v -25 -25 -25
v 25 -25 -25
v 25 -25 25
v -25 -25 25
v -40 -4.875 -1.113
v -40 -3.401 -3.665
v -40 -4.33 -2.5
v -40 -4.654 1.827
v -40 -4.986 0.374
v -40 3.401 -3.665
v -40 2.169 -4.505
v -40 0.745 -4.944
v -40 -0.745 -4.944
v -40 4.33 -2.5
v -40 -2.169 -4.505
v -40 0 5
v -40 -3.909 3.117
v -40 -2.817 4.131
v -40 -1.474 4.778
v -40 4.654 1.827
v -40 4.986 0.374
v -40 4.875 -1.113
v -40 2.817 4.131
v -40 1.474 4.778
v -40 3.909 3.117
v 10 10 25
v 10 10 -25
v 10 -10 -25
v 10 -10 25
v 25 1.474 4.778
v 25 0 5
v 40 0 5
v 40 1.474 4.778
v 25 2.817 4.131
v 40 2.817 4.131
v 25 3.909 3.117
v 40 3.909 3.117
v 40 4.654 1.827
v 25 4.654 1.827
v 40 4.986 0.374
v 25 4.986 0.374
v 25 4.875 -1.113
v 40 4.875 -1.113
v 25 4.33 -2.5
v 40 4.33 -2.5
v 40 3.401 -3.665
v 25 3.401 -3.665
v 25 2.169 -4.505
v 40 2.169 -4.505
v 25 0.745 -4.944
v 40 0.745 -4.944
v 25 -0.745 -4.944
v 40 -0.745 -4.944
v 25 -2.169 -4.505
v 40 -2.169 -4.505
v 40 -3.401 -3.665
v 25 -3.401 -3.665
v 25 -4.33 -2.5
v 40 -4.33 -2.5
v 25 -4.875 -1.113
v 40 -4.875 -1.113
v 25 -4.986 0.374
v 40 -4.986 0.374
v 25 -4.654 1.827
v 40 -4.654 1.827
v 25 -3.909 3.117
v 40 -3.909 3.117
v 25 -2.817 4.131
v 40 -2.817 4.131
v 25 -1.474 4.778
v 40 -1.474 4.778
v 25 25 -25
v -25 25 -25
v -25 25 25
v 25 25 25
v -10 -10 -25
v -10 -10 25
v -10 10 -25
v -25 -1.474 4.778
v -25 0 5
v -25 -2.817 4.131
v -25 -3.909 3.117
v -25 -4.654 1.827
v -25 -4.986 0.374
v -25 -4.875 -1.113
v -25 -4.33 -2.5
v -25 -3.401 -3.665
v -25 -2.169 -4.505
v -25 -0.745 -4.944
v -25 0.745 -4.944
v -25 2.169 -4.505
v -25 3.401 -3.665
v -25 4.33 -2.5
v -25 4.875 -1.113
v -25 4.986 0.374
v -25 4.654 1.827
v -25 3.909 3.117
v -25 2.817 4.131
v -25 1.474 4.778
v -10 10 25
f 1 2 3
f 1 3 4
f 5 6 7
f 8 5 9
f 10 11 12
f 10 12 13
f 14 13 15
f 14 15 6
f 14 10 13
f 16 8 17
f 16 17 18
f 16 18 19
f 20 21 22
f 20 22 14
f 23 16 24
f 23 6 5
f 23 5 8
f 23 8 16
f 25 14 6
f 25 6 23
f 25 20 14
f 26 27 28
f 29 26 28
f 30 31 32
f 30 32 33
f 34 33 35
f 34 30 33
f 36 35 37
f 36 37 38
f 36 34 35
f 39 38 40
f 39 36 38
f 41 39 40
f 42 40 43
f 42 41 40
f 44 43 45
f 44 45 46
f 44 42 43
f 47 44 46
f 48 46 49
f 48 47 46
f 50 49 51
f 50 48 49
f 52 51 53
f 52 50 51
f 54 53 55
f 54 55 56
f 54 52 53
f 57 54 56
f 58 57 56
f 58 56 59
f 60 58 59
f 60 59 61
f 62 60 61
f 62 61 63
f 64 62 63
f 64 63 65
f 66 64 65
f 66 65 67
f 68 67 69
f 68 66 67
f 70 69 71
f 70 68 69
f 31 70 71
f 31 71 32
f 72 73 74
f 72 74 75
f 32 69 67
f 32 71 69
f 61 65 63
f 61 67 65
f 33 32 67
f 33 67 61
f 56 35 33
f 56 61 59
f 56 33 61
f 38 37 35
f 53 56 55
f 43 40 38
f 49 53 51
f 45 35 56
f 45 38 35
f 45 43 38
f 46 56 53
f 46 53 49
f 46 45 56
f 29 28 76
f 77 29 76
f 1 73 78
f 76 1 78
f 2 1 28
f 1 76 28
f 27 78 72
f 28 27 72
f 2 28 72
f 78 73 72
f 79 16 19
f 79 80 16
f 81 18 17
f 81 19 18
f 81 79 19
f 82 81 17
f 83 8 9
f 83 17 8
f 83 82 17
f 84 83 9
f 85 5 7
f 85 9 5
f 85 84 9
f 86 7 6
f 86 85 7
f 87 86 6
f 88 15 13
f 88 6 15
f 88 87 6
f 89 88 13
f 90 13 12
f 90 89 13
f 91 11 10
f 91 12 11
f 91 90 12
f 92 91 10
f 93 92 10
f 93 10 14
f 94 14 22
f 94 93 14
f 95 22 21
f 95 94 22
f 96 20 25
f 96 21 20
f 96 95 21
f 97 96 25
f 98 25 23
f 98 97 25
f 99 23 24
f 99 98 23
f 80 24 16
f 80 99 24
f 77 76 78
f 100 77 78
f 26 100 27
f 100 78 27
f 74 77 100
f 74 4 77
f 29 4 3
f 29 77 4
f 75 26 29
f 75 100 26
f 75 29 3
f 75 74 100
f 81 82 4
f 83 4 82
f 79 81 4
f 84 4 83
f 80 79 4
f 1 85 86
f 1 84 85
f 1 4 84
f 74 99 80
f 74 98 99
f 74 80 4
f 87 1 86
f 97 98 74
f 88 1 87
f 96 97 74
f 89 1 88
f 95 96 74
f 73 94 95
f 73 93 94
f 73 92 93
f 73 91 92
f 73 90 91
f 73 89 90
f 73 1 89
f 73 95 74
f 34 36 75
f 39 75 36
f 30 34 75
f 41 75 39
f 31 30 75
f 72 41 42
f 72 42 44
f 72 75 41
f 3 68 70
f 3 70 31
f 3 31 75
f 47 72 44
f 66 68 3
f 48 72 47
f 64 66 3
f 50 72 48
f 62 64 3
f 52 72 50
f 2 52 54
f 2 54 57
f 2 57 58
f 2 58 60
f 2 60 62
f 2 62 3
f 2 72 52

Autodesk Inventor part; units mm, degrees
ref_plane "YZ Plane" through (0, 0, 0) normal (1, 0, 0) x (0, 1, 0)
ref_plane "XZ Plane" through (0, 0, 0) normal (0, 1, 0) x (-1, 0, 0)
ref_plane "XY Plane" through (0, 0, 0) normal (0, 0, 1) x (1, 0, 0)
sketch "Sketch1" plane through (0, 0, 0) normal (0, 0, 1) x (1, 0, 0)
  line L0 (-25, 25) -> (25, 25)
  line L1 (25, 25) -> (25, -25)
  line L2 (25, -25) -> (-25, -25)
  line L3 (-25, -25) -> (-25, 25)
  line L4 (-10, 10) -> (10, 10)
  line L5 (10, 10) -> (10, -10)
  line L6 (10, -10) -> (-10, -10)
  line L7 (-10, -10) -> (-10, 10)
  point P0 (0, 0)
  dimension "d0" = 50
  dimension "d1" = 50
  dimension "d2" = 25
  dimension "d3" = 25
  dimension "d4" = 20
  dimension "d5" = 20
  dimension "d6" = 10
  dimension "d7" = 10
extrude "Extrusion1" add sketch "Sketch1" along normal mid plane 50
sketch "Sketch2" plane through (-25, -25, 25) normal (-1, 0, 0) x (0, 0, 1)
  circle A0 centre (-25, 25) radius 5
  dimension "d10" = 10
extrude "Extrusion2" add sketch "Sketch2" along normal blind 15
mirror "Mirror1" about plane through (0, 0, 0) normal (1, 0, 0) of "Extrusion2"
properties part number "prismaticFulcrum" material "Stainless Steel"
